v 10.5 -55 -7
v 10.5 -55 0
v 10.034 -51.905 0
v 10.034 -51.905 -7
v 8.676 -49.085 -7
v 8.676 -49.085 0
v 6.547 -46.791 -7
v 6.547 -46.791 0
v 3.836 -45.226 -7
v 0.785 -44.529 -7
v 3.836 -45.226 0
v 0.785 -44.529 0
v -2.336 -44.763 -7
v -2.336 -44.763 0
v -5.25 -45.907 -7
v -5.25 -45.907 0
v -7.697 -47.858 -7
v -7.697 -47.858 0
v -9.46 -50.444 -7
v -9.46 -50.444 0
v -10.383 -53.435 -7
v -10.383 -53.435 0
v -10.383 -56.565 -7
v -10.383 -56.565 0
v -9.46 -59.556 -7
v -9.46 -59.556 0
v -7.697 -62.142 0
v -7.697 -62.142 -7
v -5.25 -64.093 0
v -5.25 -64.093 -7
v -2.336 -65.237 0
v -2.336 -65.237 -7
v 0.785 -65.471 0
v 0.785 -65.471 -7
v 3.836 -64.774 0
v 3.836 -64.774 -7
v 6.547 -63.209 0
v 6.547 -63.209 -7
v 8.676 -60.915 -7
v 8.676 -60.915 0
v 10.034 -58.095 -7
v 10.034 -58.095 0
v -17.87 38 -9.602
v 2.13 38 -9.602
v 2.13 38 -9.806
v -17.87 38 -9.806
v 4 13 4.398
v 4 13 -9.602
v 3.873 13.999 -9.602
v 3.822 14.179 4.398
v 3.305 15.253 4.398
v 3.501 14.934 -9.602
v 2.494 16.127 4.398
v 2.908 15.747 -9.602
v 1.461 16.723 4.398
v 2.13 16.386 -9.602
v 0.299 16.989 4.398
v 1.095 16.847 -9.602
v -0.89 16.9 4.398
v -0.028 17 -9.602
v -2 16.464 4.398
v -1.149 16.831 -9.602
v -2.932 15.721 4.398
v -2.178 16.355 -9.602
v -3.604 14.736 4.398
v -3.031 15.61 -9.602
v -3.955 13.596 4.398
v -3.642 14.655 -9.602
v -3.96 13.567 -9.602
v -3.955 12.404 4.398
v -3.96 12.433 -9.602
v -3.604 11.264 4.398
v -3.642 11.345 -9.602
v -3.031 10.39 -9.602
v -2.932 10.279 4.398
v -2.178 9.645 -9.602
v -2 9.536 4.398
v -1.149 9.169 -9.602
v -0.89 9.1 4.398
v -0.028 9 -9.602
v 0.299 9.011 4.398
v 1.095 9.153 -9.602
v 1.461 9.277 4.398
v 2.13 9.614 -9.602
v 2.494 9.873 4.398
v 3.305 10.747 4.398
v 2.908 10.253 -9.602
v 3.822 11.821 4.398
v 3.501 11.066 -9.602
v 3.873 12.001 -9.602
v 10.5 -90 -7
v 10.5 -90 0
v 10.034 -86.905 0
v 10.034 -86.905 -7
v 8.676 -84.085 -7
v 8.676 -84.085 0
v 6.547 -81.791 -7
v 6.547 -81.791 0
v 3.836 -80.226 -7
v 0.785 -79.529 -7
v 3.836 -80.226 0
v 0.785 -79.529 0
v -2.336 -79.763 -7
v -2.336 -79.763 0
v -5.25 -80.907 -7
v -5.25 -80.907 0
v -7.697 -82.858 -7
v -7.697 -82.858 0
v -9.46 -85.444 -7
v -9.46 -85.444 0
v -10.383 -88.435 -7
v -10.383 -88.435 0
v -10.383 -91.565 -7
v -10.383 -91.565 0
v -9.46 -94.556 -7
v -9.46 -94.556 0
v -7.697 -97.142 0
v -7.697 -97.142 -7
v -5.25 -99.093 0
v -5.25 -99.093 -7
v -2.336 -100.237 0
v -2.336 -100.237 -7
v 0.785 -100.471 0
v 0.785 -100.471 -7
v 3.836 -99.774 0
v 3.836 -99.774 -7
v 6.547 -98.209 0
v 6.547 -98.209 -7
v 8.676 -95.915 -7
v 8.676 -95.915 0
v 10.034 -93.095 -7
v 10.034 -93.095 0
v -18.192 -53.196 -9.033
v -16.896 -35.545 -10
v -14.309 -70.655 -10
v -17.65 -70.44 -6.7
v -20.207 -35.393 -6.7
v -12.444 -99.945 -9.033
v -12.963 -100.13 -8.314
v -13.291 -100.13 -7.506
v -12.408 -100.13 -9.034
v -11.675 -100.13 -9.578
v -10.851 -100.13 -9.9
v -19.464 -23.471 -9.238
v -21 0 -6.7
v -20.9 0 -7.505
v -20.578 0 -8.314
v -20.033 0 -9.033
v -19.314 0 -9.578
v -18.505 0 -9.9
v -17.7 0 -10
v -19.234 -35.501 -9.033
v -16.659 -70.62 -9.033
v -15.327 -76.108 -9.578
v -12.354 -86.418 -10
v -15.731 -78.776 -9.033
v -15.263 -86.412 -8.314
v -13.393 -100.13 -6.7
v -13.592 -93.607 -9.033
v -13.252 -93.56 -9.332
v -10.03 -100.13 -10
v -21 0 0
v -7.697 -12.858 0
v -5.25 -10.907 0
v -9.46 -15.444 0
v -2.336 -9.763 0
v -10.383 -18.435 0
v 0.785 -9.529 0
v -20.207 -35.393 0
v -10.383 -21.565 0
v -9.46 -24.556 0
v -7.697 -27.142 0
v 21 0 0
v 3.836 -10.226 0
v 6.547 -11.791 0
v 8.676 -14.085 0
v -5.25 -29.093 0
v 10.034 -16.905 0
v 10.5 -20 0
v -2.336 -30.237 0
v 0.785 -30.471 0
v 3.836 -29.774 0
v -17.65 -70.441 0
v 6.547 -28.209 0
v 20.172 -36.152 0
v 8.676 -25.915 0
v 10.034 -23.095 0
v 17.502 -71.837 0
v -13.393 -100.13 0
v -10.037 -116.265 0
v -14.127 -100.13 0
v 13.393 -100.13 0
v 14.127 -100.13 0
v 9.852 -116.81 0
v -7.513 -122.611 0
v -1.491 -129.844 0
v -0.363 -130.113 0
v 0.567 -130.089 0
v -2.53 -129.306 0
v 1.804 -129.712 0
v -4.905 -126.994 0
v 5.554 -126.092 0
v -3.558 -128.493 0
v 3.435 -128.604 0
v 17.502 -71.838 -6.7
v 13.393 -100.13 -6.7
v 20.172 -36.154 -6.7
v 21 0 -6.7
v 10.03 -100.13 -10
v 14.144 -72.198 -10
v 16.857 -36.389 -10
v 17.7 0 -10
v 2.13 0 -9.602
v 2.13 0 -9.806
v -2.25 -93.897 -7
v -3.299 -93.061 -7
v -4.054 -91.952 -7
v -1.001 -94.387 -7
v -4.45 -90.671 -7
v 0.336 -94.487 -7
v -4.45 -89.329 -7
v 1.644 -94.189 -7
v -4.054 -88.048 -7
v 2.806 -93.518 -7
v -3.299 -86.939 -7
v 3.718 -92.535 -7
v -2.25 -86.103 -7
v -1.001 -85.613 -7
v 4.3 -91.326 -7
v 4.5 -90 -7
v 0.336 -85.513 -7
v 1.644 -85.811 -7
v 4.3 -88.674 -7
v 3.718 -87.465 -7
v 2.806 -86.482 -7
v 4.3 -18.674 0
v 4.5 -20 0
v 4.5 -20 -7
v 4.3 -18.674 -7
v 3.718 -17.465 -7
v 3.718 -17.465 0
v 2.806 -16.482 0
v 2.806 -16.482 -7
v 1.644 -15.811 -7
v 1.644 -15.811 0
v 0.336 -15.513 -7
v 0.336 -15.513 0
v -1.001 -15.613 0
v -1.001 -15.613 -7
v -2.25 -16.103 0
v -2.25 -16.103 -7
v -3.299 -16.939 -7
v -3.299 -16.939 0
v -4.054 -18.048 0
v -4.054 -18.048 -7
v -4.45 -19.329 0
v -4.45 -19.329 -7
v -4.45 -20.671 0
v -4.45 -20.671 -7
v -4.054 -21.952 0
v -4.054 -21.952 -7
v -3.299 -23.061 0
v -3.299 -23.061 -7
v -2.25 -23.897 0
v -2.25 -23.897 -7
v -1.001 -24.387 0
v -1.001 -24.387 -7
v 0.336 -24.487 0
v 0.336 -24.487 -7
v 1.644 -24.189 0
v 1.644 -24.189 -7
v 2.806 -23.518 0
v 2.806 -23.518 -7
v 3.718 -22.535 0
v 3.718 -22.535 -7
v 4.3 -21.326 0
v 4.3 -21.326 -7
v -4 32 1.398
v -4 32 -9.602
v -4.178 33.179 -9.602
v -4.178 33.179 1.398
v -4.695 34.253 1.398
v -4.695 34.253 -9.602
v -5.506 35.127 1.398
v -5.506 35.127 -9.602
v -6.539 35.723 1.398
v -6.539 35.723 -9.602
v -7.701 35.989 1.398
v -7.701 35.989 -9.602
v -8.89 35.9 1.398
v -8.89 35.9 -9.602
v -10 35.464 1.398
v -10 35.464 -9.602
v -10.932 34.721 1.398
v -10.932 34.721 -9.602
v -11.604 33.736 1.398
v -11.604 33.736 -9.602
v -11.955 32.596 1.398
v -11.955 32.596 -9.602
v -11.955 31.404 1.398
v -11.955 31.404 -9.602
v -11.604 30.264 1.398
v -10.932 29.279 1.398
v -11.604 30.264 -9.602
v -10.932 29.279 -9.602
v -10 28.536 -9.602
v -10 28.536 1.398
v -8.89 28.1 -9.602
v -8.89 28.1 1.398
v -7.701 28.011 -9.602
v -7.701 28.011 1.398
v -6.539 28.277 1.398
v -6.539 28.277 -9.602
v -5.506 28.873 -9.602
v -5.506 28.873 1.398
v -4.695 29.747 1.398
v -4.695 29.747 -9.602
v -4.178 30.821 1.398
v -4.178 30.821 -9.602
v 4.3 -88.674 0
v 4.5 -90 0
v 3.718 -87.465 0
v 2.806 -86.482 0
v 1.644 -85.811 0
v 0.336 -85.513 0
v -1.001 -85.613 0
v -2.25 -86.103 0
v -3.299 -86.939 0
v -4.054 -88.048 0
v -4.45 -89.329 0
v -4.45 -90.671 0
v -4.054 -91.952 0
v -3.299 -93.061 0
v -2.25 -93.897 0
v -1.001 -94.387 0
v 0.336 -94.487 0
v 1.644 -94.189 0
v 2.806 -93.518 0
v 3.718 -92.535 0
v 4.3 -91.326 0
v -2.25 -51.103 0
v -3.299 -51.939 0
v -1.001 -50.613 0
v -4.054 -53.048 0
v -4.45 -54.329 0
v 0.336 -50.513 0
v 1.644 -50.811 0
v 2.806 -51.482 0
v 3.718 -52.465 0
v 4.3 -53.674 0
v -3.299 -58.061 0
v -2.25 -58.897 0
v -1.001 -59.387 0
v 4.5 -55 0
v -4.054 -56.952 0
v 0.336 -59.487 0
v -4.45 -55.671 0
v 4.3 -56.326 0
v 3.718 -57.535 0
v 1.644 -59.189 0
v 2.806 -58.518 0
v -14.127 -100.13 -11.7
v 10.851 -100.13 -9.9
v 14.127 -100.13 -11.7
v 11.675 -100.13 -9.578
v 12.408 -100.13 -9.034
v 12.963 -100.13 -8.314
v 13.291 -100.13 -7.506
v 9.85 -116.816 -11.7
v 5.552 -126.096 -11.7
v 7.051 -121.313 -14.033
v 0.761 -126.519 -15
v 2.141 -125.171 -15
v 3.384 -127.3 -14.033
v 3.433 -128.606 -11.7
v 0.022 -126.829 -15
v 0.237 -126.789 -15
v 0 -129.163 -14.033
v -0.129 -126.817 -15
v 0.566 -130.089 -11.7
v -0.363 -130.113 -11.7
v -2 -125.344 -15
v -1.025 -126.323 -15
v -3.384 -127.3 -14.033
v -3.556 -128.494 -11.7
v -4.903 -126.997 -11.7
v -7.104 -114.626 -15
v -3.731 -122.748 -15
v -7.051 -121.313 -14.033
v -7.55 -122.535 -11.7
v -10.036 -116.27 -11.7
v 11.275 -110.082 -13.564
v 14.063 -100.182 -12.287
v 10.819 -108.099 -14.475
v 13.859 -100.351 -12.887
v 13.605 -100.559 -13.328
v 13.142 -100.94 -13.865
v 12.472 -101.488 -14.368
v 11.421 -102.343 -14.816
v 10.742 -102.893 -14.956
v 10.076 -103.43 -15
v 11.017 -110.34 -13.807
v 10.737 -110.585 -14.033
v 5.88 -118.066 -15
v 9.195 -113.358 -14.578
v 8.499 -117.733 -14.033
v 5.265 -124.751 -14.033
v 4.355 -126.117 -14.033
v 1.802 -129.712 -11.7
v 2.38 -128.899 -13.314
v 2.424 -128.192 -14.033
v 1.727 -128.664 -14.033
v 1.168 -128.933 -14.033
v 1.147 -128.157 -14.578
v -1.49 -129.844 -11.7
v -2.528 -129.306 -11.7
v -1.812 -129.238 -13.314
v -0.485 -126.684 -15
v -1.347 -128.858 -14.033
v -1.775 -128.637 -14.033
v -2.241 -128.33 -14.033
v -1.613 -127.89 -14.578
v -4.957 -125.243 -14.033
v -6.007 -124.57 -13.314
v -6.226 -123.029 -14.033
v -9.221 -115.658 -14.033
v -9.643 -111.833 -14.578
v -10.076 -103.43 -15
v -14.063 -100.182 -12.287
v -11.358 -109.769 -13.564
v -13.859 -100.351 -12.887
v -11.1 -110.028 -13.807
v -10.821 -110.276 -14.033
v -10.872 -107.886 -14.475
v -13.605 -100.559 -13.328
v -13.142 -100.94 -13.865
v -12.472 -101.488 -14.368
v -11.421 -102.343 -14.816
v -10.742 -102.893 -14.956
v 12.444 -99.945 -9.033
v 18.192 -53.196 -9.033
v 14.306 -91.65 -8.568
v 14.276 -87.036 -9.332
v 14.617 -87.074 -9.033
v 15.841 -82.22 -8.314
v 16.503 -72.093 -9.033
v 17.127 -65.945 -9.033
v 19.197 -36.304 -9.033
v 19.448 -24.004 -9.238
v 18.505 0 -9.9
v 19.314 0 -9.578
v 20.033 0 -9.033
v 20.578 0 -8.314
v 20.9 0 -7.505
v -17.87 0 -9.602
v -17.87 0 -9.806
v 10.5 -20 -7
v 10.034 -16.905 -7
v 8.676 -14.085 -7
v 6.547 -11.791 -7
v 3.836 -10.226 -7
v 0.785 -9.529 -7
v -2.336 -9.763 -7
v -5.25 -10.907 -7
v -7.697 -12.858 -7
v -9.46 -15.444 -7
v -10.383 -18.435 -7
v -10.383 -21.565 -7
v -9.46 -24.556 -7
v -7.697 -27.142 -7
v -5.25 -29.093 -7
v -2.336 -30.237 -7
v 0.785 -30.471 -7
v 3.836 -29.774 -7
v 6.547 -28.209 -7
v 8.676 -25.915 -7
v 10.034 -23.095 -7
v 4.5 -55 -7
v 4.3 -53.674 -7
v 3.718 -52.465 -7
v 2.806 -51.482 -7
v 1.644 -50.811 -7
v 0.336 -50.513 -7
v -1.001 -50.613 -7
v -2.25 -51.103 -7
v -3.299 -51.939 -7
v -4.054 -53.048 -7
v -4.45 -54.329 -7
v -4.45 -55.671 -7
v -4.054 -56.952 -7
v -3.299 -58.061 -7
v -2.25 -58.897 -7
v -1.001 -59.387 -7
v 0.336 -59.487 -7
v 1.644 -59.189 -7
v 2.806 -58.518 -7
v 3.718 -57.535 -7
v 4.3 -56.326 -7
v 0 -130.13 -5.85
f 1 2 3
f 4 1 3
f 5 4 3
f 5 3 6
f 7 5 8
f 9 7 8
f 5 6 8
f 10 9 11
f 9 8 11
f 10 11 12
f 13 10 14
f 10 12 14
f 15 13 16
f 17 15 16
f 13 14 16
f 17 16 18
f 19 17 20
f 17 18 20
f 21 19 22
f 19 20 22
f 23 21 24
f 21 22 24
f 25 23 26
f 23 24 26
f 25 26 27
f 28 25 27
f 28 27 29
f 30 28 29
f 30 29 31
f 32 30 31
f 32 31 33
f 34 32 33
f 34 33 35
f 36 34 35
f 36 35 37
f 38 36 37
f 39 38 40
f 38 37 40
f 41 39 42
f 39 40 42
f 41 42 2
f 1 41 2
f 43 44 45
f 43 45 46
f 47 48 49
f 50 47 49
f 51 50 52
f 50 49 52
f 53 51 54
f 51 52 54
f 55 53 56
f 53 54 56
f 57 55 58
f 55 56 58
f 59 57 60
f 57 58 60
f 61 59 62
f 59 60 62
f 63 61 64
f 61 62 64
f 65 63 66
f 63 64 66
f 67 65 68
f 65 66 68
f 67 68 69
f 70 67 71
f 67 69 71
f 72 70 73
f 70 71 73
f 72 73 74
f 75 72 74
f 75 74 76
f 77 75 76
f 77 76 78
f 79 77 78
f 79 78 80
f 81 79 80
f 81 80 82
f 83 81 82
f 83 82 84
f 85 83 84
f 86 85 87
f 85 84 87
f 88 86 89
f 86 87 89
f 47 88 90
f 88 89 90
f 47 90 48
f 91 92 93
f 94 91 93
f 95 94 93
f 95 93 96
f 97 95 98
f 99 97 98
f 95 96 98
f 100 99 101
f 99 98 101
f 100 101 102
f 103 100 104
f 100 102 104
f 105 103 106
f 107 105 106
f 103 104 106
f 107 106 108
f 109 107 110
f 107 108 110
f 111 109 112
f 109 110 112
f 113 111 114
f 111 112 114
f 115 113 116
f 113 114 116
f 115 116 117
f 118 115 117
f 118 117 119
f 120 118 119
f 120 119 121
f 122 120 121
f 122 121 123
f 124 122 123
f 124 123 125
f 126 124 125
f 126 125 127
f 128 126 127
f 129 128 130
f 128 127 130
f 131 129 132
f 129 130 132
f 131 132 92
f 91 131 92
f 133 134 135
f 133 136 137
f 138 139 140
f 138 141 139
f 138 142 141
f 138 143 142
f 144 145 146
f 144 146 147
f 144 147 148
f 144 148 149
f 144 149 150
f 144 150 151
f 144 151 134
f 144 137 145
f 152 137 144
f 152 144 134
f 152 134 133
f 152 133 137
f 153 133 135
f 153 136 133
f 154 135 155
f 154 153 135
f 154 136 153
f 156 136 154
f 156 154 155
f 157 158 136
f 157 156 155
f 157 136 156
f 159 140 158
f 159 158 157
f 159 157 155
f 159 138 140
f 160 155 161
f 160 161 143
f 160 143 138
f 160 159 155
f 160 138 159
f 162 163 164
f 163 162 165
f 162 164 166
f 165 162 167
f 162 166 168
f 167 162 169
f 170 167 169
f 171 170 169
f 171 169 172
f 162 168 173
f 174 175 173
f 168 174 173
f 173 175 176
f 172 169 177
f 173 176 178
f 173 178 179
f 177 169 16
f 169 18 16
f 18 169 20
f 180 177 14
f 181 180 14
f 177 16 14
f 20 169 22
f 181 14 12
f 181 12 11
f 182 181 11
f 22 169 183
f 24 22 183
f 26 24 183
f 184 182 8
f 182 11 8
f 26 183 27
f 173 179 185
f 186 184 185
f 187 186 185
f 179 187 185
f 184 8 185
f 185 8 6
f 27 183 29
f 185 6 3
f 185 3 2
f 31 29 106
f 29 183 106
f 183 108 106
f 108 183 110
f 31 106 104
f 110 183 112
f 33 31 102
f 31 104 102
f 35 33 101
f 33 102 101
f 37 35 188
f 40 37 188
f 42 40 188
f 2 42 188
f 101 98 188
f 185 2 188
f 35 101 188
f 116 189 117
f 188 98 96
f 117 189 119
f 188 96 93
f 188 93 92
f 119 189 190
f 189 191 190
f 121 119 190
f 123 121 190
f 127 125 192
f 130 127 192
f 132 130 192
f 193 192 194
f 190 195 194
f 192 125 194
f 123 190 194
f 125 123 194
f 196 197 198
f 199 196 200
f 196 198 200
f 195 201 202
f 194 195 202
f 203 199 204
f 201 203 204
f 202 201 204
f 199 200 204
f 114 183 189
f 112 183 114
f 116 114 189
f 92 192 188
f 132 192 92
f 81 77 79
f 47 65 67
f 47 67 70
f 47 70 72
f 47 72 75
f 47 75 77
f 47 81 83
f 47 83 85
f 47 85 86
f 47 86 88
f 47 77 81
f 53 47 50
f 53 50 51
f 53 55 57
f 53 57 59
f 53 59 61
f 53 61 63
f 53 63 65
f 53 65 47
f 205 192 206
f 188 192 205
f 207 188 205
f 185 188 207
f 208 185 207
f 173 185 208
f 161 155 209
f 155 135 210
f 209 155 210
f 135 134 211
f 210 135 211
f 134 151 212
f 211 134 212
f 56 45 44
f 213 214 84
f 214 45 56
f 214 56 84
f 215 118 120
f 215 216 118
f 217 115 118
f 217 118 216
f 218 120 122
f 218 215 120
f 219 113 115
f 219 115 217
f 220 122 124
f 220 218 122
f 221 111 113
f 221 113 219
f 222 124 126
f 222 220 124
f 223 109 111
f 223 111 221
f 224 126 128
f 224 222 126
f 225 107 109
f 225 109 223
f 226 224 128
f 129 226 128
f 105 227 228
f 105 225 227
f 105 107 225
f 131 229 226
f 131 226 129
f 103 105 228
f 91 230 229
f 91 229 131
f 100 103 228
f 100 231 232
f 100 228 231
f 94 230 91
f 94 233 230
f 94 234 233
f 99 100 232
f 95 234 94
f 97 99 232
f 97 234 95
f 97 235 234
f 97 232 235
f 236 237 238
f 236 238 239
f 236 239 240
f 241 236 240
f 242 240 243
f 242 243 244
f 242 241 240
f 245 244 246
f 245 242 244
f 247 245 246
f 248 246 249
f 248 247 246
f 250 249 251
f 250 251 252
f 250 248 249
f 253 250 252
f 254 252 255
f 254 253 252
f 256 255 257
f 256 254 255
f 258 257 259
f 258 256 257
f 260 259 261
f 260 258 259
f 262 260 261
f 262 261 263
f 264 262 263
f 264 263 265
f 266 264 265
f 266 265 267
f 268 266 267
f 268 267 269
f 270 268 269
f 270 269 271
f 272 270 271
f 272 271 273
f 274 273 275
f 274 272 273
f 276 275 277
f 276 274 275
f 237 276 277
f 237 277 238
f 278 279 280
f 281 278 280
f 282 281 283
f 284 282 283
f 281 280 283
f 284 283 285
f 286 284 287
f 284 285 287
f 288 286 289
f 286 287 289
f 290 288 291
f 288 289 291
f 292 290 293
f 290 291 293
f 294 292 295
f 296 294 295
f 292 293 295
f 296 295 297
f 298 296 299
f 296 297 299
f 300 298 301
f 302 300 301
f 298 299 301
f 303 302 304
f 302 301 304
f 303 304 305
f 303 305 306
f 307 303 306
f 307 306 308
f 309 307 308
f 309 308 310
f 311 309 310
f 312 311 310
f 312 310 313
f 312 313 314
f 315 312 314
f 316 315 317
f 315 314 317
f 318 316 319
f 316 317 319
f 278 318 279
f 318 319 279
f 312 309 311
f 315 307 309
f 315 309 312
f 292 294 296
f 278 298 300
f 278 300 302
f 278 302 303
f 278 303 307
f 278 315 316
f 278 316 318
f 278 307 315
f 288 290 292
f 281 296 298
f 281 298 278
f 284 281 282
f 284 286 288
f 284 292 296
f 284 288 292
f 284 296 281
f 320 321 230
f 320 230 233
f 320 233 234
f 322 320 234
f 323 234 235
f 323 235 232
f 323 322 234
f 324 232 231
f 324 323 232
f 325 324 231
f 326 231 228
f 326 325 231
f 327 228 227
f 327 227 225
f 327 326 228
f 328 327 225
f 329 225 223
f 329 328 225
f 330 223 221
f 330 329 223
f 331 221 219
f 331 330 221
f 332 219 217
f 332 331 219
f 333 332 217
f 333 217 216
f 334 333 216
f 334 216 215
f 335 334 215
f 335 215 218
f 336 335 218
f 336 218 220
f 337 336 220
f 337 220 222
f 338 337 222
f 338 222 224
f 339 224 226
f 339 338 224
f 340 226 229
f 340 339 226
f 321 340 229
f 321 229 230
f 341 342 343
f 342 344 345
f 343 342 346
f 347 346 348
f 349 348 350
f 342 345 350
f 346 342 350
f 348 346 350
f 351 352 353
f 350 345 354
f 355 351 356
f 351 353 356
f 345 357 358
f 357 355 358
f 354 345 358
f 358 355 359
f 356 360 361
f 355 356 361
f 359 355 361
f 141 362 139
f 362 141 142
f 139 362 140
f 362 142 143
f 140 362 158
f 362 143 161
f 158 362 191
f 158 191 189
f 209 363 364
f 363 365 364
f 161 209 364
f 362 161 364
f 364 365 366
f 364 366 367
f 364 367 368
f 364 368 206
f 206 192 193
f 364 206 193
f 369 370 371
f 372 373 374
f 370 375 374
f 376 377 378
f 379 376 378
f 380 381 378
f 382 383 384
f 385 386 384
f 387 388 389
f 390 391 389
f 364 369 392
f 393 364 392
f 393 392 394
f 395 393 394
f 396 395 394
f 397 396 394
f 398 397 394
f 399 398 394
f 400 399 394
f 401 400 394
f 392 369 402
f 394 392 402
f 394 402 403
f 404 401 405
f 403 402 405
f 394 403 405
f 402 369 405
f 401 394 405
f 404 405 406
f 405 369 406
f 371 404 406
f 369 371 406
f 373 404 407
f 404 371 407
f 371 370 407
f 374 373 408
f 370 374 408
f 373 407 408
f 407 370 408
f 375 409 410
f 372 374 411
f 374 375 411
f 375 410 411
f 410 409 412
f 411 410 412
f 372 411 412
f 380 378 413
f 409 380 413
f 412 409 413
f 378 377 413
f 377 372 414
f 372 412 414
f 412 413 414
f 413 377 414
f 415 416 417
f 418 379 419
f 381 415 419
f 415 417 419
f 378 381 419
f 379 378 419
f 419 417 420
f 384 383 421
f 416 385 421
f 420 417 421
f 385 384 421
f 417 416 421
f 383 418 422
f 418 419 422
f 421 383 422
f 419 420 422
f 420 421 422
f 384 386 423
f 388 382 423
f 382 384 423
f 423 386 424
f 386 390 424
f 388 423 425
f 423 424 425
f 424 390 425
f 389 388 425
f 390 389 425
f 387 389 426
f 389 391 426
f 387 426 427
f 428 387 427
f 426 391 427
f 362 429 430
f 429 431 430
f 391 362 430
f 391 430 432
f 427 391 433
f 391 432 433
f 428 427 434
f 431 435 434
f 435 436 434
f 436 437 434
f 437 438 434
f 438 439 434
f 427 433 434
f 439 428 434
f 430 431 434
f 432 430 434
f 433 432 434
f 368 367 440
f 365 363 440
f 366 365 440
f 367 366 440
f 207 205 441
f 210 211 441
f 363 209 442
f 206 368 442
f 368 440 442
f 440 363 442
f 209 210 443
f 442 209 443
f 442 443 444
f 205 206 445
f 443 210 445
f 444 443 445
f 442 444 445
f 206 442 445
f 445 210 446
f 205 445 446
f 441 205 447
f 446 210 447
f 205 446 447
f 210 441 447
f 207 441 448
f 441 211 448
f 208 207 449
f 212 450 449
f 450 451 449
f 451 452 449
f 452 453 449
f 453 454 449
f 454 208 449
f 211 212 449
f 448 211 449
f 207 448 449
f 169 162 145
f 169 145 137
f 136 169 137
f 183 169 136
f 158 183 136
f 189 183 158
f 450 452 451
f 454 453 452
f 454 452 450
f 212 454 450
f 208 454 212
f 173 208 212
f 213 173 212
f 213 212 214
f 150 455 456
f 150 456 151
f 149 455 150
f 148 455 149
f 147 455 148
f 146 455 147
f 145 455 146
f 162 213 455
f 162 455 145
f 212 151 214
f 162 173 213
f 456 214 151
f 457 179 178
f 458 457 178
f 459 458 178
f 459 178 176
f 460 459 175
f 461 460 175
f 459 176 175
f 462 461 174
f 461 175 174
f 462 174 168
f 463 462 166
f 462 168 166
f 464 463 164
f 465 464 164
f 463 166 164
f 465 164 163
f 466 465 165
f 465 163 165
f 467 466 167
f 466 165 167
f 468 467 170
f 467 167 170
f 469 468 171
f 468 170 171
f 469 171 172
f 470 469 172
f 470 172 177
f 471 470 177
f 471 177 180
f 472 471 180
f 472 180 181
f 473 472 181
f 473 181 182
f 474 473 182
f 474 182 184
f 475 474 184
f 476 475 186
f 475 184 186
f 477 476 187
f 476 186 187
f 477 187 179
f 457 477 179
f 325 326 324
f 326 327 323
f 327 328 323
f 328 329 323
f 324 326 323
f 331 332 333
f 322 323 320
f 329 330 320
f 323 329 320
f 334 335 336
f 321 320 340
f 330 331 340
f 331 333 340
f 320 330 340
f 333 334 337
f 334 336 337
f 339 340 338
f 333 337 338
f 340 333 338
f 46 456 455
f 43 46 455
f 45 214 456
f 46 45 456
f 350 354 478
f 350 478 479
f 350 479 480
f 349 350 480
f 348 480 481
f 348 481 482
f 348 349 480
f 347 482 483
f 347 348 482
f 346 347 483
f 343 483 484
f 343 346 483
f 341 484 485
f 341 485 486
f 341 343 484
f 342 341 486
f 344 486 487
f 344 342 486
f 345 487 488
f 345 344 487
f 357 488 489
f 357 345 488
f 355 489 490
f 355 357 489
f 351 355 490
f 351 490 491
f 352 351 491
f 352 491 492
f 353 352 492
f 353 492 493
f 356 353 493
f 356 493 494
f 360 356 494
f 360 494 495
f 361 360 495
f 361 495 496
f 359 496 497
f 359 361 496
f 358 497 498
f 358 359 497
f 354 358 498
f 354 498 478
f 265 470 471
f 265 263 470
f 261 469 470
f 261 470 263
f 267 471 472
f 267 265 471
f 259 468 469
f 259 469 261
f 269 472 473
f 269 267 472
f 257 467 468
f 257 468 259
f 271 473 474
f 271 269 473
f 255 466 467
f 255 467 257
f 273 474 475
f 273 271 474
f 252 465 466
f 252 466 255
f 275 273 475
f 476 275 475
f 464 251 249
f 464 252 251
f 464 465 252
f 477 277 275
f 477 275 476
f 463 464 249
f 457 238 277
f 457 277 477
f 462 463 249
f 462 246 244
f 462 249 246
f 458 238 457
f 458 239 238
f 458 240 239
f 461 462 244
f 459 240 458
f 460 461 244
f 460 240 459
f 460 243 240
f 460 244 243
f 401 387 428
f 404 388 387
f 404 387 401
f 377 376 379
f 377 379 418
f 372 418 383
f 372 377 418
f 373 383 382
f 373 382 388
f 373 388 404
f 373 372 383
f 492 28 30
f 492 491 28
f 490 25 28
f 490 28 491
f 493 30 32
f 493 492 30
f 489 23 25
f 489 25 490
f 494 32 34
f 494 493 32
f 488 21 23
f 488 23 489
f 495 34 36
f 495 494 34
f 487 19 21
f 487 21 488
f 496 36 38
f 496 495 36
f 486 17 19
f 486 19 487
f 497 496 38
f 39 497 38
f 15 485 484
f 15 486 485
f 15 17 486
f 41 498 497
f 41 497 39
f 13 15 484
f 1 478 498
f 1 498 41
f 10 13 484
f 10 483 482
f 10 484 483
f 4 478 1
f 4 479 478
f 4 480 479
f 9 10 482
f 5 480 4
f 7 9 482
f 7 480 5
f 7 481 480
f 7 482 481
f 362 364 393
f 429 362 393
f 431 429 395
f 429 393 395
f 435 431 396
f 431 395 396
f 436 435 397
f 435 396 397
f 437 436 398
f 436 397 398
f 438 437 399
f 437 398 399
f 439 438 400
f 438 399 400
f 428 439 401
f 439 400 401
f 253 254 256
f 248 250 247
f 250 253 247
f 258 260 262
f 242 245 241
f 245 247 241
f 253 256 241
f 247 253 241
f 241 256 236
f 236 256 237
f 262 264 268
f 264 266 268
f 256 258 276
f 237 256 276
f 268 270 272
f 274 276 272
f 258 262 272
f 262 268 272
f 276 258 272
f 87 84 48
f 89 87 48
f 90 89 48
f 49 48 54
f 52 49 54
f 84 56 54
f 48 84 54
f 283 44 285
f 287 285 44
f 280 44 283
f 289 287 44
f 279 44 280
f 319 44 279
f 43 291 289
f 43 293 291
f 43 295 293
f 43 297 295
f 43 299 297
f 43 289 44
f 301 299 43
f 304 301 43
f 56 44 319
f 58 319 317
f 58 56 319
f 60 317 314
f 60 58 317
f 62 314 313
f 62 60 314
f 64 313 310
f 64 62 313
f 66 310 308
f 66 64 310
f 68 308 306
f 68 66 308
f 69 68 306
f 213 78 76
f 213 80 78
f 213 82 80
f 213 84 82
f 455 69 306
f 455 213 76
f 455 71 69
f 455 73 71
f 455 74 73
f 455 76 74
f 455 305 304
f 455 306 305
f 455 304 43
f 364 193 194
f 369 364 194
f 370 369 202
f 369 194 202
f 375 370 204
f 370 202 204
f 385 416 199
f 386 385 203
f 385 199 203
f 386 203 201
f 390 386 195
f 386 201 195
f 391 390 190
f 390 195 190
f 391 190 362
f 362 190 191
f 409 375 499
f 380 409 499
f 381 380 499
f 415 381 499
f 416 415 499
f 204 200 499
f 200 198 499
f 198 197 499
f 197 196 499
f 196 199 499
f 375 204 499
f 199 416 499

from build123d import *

# Parameters (mm, degrees)
PAD001_DEPTH           = 10
PAD002_DEPTH           = 15
FILLET_R               = 3.3
SKETCH007_R            = 10.5
SKETCH007_R_2          = 4.5
POCKET001_DEPTH        = 7
LINEARPATTERN001_COUNT = 3
LINEARPATTERN001_PITCH = 35
SKETCH008_W            = 20
SKETCH008_H            = 0.204143
PAD004_DEPTH           = 38
SKETCH009_R            = 4
PAD005_DEPTH           = 14
SKETCH010_R            = 4
PAD006_DEPTH           = 11


with BuildPart() as part:
    # Sketch001 → Pad001 (new body)
    with BuildSketch(Plane.XY):
        with BuildLine():
            add(Edge.make_bspline(
                [(-21, 0), (-21, -130), (0, -130), (21, -130), (21, 0)],
                knots=[4.712389, 4.712389, 4.712389, 6.283185, 6.283185, 7.853982, 7.853982, 7.853982], degree=2, weights=[1, 0.707107, 1, 0.707107, 1]))
            Line((21, 0), (-21, 0))
        make_face()
    extrude(amount=-PAD001_DEPTH)

    # Sketch004 (on Face4 of Pad001) → Pad002 (join)
    with BuildSketch(Plane(origin=(0, 0, 0), x_dir=(1, 0, 0), z_dir=(0, 0, -1))):
        with BuildLine():
            add(Edge.make_bspline(
                [(14.127174, 100.12989), (0, 172.550511), (-14.127174, 100.12989)],
                knots=[2.356331, 2.356331, 2.356331, 3.926854, 3.926854, 3.926854], degree=2, weights=[1, 0.707203, 1]))
            Line((-14.127174, 100.12989), (14.127174, 100.12989))
        make_face()
    extrude(amount=PAD002_DEPTH)

    # Fillet
    fillet_edges = [part.edges().sort_by_distance(p)[0] for p in [
        (-0.005047, -130.129887, -15),
        (0, -100.12989, -15),
        (19.368374, -50.240623, -10),
        (-19.368374, -50.240623, -10),
    ]]
    fillet(fillet_edges, radius=FILLET_R)

    # Sketch007 → Pocket001 (cut)
    with BuildSketch(Plane.XY):
        with Locations((0, -90)):
            Circle(SKETCH007_R)
        with Locations((0, -90)):
            Circle(SKETCH007_R_2, mode=Mode.SUBTRACT)
    pocket001 = extrude(amount=-POCKET001_DEPTH, mode=Mode.SUBTRACT)

    # LinearPattern001: Pocket001 ×3
    with Locations(*[(0, i * LINEARPATTERN001_PITCH, 0) for i in range(1, LINEARPATTERN001_COUNT)]):
        add(pocket001, mode=Mode.SUBTRACT)

    # Sketch008 (on Face5 of LinearPattern001) → Pad004 (join)
    with BuildSketch(Plane(origin=(0, 0, 0), x_dir=(-1, 0, 0), z_dir=(0, 1, 0))):
        with Locations((7.869961, -9.70371)):
            Rectangle(SKETCH008_W, SKETCH008_H)
    extrude(amount=PAD004_DEPTH)

    # Sketch009 (on Face16 of Pad004) → Pad005 (join)
    with BuildSketch(Plane.XY.offset(-9.601639)):
        with Locations((0, 13)):
            Circle(SKETCH009_R)
    extrude(amount=PAD005_DEPTH)

    # Sketch010 (on Face16 of Pad005) → Pad006 (join)
    with BuildSketch(Plane.XY.offset(-9.601639)):
        with Locations((-8, 32)):
            Circle(SKETCH010_R)
    extrude(amount=PAD006_DEPTH)


solid = part.part
